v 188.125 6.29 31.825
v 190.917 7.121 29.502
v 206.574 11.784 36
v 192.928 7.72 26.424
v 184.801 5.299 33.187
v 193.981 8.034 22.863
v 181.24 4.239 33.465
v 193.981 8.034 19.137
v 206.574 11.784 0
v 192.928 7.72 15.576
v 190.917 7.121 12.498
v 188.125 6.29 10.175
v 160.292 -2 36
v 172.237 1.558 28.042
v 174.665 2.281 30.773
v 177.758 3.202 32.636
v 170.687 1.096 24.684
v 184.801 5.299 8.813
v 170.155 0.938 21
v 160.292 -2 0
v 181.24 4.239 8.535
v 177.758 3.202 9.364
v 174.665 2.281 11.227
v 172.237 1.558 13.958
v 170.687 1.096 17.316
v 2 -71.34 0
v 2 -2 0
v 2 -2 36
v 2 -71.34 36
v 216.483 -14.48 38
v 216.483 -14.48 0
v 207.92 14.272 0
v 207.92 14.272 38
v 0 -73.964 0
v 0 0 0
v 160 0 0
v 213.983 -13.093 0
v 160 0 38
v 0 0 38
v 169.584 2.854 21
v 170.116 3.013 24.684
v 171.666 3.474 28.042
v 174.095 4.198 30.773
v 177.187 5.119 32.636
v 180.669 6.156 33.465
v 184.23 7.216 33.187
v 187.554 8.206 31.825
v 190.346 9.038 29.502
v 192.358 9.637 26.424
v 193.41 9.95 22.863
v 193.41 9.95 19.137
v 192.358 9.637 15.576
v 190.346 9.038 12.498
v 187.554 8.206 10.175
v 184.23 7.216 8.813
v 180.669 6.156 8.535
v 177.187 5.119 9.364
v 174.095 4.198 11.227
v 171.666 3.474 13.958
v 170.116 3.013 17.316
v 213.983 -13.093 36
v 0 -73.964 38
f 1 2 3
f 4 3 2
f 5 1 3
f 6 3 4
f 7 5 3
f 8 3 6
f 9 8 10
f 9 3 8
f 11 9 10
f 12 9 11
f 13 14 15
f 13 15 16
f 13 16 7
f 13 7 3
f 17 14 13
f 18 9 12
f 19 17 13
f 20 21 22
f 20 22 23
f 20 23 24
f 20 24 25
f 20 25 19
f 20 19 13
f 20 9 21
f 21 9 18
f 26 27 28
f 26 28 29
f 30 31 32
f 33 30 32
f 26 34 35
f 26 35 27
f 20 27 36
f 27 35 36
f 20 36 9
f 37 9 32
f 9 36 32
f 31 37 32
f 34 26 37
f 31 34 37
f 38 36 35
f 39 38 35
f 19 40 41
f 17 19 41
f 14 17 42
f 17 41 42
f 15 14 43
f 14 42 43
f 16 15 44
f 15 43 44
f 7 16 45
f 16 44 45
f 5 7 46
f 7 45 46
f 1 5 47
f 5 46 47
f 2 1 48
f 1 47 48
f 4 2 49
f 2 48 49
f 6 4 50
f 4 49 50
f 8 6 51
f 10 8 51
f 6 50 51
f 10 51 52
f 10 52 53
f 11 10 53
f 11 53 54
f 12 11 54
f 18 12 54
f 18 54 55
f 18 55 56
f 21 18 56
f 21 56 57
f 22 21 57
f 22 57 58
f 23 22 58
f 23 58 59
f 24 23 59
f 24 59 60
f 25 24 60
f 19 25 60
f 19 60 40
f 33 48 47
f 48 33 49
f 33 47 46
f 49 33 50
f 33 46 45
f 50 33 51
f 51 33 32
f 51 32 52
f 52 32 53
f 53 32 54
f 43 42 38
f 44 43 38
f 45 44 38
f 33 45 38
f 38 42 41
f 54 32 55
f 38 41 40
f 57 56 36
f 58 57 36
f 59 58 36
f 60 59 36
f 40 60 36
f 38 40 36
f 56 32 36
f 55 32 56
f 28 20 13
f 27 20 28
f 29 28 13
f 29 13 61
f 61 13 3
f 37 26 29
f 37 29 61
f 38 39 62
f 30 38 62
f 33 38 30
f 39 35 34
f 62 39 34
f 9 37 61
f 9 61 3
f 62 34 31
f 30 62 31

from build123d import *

# Parameters (mm, degrees)
F1_DEPTH = 38
F2_T     = -2
F3_R     = 12.5
F4_DEPTH = 25


with BuildPart() as f1:
    # F0 (on Top) → F1 (new body)
    with BuildSketch(Plane.XY):
        Polygon((160, 0), (0, 0), (0, -73.9635457095), (160, -30), (216.4829908138, -14.4800465722), (207.9198667331, 14.2718734677), align=None)
    extrude(amount=F1_DEPTH)

    # F2
    f2_openings = [f1.faces().sort_by_distance(p)[0] for p in [
        (87.670015, -24.375583, 0),
    ]]
    offset(amount=F2_T, openings=f2_openings, kind=Kind.INTERSECTION)

    # F3 (on face) → F4 (cut)
    with BuildSketch(Plane(origin=(13.0359278258, -43.7700015747, 0), x_dir=(-0.9583973347, -0.2854374694, 0), z_dir=(-0.2854374694, 0.9583973347, 0))):
        with Locations((-175.843573546, 21)):
            Circle(F3_R)
    extrude(amount=-F4_DEPTH, mode=Mode.SUBTRACT)


solid = f1.part
